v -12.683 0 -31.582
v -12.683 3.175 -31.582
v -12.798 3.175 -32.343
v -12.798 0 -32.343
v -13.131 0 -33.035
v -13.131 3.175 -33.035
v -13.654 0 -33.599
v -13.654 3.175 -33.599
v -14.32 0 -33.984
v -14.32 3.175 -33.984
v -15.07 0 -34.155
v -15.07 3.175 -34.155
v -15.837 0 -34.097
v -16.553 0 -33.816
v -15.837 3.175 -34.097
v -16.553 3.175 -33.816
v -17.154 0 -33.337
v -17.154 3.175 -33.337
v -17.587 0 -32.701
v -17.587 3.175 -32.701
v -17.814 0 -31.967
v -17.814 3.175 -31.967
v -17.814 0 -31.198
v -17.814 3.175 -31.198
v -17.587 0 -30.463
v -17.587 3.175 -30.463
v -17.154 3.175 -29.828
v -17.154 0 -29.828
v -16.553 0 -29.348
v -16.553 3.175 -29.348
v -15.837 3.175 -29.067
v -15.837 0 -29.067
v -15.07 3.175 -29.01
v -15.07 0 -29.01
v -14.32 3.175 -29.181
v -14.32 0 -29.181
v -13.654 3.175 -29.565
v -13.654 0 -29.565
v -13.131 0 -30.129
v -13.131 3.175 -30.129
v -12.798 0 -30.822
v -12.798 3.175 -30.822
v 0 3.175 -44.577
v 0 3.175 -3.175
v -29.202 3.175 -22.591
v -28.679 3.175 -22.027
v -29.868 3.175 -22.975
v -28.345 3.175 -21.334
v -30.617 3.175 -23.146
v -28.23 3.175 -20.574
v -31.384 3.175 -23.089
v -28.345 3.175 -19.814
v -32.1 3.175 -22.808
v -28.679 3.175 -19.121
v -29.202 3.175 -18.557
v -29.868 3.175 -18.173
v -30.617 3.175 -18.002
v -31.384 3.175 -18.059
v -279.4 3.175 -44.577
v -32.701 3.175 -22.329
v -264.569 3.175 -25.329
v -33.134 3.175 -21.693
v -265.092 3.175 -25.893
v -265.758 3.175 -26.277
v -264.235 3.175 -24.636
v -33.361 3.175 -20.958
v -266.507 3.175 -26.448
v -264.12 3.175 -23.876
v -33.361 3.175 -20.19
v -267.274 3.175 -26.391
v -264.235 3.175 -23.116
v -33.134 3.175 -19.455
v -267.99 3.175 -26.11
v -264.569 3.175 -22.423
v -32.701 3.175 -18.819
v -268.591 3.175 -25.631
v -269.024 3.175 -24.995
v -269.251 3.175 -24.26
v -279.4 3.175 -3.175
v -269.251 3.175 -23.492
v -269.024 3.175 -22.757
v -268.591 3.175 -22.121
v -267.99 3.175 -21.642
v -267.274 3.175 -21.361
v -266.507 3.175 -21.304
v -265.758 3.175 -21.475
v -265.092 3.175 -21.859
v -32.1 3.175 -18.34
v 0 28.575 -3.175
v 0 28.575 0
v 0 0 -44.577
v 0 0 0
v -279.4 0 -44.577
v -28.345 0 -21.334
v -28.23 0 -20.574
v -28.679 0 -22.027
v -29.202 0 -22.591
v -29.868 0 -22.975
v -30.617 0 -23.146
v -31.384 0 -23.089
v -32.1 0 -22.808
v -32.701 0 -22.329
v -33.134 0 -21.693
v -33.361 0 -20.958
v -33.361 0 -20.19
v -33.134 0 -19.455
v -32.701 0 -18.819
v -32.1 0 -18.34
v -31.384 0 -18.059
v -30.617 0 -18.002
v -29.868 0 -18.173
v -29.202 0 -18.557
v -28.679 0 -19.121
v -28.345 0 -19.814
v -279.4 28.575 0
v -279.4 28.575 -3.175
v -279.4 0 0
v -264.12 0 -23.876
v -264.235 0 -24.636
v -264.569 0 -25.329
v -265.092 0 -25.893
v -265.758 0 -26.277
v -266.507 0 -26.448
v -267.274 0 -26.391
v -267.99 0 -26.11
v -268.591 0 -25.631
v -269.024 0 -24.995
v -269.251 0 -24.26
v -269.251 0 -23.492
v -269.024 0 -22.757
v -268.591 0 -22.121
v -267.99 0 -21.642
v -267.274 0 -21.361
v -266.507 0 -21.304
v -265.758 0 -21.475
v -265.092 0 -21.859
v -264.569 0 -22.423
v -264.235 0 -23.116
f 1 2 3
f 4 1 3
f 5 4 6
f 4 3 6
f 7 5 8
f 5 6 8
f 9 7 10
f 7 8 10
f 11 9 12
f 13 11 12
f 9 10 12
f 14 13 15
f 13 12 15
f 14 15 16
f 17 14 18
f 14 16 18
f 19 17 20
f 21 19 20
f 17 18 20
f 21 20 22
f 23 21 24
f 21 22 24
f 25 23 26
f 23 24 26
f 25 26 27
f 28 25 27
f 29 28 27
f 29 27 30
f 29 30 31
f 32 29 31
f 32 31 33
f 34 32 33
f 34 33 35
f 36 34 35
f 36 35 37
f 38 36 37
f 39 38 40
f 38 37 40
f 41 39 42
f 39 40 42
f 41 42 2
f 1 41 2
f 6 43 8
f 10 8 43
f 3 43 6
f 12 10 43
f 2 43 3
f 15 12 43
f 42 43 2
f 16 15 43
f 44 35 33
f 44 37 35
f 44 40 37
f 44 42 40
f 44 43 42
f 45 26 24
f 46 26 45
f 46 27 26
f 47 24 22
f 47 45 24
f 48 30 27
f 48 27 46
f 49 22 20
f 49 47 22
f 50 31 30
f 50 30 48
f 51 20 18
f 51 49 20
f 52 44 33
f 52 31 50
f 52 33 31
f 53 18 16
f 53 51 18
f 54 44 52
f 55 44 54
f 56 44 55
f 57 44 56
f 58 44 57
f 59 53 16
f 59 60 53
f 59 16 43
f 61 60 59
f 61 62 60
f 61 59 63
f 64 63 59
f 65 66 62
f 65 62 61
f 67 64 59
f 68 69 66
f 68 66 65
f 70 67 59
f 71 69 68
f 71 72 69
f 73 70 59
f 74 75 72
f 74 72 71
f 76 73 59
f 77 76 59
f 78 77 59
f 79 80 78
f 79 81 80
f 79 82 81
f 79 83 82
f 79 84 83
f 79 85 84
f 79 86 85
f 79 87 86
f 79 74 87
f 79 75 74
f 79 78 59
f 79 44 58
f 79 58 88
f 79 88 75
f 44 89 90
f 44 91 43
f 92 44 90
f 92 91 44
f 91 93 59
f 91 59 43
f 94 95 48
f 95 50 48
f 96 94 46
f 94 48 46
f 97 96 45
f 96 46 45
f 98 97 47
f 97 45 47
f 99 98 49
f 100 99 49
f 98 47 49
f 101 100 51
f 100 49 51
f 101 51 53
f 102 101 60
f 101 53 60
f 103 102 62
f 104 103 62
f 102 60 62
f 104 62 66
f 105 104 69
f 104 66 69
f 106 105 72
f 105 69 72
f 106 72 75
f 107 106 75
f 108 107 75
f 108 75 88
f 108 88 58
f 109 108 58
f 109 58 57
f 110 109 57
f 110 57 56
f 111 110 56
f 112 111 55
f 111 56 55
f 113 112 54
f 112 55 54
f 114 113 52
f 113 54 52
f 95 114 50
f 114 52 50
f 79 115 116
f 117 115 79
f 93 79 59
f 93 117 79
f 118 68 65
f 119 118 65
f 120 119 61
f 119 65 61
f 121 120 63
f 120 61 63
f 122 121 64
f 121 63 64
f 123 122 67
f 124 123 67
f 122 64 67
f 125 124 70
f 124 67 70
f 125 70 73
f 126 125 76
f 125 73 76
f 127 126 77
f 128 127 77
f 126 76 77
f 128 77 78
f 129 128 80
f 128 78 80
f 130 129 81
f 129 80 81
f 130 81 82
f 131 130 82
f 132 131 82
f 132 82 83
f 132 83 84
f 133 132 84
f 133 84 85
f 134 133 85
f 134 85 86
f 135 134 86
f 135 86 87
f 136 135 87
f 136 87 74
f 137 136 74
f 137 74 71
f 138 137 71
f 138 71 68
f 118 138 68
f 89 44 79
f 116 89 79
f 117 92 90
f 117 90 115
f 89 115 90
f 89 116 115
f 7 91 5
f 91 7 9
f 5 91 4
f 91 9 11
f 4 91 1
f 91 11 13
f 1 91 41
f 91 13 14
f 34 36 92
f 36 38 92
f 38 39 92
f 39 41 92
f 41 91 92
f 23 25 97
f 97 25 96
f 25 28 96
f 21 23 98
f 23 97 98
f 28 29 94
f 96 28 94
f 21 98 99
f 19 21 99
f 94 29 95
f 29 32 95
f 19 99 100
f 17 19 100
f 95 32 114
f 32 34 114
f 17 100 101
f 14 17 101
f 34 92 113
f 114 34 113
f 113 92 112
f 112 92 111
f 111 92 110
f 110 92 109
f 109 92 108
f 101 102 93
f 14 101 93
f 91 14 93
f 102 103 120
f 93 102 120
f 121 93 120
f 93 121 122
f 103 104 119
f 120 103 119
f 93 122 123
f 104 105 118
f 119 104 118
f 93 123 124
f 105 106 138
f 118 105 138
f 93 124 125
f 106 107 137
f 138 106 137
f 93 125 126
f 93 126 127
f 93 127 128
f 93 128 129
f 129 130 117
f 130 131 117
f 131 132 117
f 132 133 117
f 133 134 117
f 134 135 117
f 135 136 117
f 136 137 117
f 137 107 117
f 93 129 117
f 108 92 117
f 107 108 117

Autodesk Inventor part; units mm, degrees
ref_plane "YZ Plane" through (0, 0, 0) normal (1, 0, 0) x (0, 1, 0)
ref_plane "XZ Plane" through (0, 0, 0) normal (0, 1, 0) x (-1, 0, 0)
ref_plane "XY Plane" through (0, 0, 0) normal (0, 0, 1) x (1, 0, 0)
sketch "Sketch1" plane through (0, 0, 0) normal (0, 1, 0) x (-1, 0, 0)
  line L0 (0, 0) -> (279.4, 0)
  line L1 (279.4, 0) -> (279.4, -44.577)
  line L2 (279.4, -44.577) -> (0, -44.577)
  line L3 (0, -44.577) -> (0, 0)
  dimension "d0" = 279.4
  dimension "d1" = 44.577
extrude "Extrusion1" add sketch "Sketch1" along normal blind 3.175
sketch "Sketch2" plane through (0, 3.175, 0) normal (0, 1, 0) x (1, 0, 0)
  line L0 (-279.4, 0) -> (0, 0) projected
  line L1 (-279.4, 0) -> (0, 0)
  line L2 (0, 0) -> (0, 3.175)
  line L3 (0, 3.175) -> (-279.4, 3.175)
  line L4 (-279.4, 3.175) -> (-279.4, 0)
  dimension "d4" = 279.4
  dimension "d5" = 3.175
extrude "Extrusion2" add sketch "Sketch2" along normal blind 25.4
sketch "Sketch3" plane through (0, 3.175, 0) normal (0, 1, 0) x (1, 0, 0)
  line L0 (0, 3.175) -> (0, 44.577) construction
  line L1 (0, 44.577) -> (-279.4, 44.577) construction
  line L2 (-139.7, 44.577) -> (-139.7, 3.175) construction
  line L3 (0, 44.577) -> (-30.8102, 44.577) construction
  line L4 (-30.8102, 44.577) -> (-30.8102, 20.574) construction
  circle A0 centre (-30.8102, 20.574) radius 2.5797
  line L5 (-30.8102, 20.574) -> (-15.2628, 31.5822) construction
  circle A1 centre (-15.2628, 31.5822) radius 2.5797
  point P0 (0, 0)
extrude "Extrusion3" cut sketch "Sketch3" against normal blind 25.4
sketch "Sketch4" plane through (0, 3.175, 0) normal (0, 1, 0) x (1, 0, 0)
  line L0 (-279.4, 44.577) -> (-279.4, 3.175) construction
  line L1 (-279.4, 23.876) -> (-266.7, 23.876) construction
  circle A0 centre (-266.7, 23.876) radius 2.5797
  point P0 (0, 0)
  dimension "d26" = 12.7
  dimension "d27" = 5.1594
extrude "Extrusion4" cut sketch "Sketch4" against normal blind 25.4
properties part number "angle iron with  holes 1"
